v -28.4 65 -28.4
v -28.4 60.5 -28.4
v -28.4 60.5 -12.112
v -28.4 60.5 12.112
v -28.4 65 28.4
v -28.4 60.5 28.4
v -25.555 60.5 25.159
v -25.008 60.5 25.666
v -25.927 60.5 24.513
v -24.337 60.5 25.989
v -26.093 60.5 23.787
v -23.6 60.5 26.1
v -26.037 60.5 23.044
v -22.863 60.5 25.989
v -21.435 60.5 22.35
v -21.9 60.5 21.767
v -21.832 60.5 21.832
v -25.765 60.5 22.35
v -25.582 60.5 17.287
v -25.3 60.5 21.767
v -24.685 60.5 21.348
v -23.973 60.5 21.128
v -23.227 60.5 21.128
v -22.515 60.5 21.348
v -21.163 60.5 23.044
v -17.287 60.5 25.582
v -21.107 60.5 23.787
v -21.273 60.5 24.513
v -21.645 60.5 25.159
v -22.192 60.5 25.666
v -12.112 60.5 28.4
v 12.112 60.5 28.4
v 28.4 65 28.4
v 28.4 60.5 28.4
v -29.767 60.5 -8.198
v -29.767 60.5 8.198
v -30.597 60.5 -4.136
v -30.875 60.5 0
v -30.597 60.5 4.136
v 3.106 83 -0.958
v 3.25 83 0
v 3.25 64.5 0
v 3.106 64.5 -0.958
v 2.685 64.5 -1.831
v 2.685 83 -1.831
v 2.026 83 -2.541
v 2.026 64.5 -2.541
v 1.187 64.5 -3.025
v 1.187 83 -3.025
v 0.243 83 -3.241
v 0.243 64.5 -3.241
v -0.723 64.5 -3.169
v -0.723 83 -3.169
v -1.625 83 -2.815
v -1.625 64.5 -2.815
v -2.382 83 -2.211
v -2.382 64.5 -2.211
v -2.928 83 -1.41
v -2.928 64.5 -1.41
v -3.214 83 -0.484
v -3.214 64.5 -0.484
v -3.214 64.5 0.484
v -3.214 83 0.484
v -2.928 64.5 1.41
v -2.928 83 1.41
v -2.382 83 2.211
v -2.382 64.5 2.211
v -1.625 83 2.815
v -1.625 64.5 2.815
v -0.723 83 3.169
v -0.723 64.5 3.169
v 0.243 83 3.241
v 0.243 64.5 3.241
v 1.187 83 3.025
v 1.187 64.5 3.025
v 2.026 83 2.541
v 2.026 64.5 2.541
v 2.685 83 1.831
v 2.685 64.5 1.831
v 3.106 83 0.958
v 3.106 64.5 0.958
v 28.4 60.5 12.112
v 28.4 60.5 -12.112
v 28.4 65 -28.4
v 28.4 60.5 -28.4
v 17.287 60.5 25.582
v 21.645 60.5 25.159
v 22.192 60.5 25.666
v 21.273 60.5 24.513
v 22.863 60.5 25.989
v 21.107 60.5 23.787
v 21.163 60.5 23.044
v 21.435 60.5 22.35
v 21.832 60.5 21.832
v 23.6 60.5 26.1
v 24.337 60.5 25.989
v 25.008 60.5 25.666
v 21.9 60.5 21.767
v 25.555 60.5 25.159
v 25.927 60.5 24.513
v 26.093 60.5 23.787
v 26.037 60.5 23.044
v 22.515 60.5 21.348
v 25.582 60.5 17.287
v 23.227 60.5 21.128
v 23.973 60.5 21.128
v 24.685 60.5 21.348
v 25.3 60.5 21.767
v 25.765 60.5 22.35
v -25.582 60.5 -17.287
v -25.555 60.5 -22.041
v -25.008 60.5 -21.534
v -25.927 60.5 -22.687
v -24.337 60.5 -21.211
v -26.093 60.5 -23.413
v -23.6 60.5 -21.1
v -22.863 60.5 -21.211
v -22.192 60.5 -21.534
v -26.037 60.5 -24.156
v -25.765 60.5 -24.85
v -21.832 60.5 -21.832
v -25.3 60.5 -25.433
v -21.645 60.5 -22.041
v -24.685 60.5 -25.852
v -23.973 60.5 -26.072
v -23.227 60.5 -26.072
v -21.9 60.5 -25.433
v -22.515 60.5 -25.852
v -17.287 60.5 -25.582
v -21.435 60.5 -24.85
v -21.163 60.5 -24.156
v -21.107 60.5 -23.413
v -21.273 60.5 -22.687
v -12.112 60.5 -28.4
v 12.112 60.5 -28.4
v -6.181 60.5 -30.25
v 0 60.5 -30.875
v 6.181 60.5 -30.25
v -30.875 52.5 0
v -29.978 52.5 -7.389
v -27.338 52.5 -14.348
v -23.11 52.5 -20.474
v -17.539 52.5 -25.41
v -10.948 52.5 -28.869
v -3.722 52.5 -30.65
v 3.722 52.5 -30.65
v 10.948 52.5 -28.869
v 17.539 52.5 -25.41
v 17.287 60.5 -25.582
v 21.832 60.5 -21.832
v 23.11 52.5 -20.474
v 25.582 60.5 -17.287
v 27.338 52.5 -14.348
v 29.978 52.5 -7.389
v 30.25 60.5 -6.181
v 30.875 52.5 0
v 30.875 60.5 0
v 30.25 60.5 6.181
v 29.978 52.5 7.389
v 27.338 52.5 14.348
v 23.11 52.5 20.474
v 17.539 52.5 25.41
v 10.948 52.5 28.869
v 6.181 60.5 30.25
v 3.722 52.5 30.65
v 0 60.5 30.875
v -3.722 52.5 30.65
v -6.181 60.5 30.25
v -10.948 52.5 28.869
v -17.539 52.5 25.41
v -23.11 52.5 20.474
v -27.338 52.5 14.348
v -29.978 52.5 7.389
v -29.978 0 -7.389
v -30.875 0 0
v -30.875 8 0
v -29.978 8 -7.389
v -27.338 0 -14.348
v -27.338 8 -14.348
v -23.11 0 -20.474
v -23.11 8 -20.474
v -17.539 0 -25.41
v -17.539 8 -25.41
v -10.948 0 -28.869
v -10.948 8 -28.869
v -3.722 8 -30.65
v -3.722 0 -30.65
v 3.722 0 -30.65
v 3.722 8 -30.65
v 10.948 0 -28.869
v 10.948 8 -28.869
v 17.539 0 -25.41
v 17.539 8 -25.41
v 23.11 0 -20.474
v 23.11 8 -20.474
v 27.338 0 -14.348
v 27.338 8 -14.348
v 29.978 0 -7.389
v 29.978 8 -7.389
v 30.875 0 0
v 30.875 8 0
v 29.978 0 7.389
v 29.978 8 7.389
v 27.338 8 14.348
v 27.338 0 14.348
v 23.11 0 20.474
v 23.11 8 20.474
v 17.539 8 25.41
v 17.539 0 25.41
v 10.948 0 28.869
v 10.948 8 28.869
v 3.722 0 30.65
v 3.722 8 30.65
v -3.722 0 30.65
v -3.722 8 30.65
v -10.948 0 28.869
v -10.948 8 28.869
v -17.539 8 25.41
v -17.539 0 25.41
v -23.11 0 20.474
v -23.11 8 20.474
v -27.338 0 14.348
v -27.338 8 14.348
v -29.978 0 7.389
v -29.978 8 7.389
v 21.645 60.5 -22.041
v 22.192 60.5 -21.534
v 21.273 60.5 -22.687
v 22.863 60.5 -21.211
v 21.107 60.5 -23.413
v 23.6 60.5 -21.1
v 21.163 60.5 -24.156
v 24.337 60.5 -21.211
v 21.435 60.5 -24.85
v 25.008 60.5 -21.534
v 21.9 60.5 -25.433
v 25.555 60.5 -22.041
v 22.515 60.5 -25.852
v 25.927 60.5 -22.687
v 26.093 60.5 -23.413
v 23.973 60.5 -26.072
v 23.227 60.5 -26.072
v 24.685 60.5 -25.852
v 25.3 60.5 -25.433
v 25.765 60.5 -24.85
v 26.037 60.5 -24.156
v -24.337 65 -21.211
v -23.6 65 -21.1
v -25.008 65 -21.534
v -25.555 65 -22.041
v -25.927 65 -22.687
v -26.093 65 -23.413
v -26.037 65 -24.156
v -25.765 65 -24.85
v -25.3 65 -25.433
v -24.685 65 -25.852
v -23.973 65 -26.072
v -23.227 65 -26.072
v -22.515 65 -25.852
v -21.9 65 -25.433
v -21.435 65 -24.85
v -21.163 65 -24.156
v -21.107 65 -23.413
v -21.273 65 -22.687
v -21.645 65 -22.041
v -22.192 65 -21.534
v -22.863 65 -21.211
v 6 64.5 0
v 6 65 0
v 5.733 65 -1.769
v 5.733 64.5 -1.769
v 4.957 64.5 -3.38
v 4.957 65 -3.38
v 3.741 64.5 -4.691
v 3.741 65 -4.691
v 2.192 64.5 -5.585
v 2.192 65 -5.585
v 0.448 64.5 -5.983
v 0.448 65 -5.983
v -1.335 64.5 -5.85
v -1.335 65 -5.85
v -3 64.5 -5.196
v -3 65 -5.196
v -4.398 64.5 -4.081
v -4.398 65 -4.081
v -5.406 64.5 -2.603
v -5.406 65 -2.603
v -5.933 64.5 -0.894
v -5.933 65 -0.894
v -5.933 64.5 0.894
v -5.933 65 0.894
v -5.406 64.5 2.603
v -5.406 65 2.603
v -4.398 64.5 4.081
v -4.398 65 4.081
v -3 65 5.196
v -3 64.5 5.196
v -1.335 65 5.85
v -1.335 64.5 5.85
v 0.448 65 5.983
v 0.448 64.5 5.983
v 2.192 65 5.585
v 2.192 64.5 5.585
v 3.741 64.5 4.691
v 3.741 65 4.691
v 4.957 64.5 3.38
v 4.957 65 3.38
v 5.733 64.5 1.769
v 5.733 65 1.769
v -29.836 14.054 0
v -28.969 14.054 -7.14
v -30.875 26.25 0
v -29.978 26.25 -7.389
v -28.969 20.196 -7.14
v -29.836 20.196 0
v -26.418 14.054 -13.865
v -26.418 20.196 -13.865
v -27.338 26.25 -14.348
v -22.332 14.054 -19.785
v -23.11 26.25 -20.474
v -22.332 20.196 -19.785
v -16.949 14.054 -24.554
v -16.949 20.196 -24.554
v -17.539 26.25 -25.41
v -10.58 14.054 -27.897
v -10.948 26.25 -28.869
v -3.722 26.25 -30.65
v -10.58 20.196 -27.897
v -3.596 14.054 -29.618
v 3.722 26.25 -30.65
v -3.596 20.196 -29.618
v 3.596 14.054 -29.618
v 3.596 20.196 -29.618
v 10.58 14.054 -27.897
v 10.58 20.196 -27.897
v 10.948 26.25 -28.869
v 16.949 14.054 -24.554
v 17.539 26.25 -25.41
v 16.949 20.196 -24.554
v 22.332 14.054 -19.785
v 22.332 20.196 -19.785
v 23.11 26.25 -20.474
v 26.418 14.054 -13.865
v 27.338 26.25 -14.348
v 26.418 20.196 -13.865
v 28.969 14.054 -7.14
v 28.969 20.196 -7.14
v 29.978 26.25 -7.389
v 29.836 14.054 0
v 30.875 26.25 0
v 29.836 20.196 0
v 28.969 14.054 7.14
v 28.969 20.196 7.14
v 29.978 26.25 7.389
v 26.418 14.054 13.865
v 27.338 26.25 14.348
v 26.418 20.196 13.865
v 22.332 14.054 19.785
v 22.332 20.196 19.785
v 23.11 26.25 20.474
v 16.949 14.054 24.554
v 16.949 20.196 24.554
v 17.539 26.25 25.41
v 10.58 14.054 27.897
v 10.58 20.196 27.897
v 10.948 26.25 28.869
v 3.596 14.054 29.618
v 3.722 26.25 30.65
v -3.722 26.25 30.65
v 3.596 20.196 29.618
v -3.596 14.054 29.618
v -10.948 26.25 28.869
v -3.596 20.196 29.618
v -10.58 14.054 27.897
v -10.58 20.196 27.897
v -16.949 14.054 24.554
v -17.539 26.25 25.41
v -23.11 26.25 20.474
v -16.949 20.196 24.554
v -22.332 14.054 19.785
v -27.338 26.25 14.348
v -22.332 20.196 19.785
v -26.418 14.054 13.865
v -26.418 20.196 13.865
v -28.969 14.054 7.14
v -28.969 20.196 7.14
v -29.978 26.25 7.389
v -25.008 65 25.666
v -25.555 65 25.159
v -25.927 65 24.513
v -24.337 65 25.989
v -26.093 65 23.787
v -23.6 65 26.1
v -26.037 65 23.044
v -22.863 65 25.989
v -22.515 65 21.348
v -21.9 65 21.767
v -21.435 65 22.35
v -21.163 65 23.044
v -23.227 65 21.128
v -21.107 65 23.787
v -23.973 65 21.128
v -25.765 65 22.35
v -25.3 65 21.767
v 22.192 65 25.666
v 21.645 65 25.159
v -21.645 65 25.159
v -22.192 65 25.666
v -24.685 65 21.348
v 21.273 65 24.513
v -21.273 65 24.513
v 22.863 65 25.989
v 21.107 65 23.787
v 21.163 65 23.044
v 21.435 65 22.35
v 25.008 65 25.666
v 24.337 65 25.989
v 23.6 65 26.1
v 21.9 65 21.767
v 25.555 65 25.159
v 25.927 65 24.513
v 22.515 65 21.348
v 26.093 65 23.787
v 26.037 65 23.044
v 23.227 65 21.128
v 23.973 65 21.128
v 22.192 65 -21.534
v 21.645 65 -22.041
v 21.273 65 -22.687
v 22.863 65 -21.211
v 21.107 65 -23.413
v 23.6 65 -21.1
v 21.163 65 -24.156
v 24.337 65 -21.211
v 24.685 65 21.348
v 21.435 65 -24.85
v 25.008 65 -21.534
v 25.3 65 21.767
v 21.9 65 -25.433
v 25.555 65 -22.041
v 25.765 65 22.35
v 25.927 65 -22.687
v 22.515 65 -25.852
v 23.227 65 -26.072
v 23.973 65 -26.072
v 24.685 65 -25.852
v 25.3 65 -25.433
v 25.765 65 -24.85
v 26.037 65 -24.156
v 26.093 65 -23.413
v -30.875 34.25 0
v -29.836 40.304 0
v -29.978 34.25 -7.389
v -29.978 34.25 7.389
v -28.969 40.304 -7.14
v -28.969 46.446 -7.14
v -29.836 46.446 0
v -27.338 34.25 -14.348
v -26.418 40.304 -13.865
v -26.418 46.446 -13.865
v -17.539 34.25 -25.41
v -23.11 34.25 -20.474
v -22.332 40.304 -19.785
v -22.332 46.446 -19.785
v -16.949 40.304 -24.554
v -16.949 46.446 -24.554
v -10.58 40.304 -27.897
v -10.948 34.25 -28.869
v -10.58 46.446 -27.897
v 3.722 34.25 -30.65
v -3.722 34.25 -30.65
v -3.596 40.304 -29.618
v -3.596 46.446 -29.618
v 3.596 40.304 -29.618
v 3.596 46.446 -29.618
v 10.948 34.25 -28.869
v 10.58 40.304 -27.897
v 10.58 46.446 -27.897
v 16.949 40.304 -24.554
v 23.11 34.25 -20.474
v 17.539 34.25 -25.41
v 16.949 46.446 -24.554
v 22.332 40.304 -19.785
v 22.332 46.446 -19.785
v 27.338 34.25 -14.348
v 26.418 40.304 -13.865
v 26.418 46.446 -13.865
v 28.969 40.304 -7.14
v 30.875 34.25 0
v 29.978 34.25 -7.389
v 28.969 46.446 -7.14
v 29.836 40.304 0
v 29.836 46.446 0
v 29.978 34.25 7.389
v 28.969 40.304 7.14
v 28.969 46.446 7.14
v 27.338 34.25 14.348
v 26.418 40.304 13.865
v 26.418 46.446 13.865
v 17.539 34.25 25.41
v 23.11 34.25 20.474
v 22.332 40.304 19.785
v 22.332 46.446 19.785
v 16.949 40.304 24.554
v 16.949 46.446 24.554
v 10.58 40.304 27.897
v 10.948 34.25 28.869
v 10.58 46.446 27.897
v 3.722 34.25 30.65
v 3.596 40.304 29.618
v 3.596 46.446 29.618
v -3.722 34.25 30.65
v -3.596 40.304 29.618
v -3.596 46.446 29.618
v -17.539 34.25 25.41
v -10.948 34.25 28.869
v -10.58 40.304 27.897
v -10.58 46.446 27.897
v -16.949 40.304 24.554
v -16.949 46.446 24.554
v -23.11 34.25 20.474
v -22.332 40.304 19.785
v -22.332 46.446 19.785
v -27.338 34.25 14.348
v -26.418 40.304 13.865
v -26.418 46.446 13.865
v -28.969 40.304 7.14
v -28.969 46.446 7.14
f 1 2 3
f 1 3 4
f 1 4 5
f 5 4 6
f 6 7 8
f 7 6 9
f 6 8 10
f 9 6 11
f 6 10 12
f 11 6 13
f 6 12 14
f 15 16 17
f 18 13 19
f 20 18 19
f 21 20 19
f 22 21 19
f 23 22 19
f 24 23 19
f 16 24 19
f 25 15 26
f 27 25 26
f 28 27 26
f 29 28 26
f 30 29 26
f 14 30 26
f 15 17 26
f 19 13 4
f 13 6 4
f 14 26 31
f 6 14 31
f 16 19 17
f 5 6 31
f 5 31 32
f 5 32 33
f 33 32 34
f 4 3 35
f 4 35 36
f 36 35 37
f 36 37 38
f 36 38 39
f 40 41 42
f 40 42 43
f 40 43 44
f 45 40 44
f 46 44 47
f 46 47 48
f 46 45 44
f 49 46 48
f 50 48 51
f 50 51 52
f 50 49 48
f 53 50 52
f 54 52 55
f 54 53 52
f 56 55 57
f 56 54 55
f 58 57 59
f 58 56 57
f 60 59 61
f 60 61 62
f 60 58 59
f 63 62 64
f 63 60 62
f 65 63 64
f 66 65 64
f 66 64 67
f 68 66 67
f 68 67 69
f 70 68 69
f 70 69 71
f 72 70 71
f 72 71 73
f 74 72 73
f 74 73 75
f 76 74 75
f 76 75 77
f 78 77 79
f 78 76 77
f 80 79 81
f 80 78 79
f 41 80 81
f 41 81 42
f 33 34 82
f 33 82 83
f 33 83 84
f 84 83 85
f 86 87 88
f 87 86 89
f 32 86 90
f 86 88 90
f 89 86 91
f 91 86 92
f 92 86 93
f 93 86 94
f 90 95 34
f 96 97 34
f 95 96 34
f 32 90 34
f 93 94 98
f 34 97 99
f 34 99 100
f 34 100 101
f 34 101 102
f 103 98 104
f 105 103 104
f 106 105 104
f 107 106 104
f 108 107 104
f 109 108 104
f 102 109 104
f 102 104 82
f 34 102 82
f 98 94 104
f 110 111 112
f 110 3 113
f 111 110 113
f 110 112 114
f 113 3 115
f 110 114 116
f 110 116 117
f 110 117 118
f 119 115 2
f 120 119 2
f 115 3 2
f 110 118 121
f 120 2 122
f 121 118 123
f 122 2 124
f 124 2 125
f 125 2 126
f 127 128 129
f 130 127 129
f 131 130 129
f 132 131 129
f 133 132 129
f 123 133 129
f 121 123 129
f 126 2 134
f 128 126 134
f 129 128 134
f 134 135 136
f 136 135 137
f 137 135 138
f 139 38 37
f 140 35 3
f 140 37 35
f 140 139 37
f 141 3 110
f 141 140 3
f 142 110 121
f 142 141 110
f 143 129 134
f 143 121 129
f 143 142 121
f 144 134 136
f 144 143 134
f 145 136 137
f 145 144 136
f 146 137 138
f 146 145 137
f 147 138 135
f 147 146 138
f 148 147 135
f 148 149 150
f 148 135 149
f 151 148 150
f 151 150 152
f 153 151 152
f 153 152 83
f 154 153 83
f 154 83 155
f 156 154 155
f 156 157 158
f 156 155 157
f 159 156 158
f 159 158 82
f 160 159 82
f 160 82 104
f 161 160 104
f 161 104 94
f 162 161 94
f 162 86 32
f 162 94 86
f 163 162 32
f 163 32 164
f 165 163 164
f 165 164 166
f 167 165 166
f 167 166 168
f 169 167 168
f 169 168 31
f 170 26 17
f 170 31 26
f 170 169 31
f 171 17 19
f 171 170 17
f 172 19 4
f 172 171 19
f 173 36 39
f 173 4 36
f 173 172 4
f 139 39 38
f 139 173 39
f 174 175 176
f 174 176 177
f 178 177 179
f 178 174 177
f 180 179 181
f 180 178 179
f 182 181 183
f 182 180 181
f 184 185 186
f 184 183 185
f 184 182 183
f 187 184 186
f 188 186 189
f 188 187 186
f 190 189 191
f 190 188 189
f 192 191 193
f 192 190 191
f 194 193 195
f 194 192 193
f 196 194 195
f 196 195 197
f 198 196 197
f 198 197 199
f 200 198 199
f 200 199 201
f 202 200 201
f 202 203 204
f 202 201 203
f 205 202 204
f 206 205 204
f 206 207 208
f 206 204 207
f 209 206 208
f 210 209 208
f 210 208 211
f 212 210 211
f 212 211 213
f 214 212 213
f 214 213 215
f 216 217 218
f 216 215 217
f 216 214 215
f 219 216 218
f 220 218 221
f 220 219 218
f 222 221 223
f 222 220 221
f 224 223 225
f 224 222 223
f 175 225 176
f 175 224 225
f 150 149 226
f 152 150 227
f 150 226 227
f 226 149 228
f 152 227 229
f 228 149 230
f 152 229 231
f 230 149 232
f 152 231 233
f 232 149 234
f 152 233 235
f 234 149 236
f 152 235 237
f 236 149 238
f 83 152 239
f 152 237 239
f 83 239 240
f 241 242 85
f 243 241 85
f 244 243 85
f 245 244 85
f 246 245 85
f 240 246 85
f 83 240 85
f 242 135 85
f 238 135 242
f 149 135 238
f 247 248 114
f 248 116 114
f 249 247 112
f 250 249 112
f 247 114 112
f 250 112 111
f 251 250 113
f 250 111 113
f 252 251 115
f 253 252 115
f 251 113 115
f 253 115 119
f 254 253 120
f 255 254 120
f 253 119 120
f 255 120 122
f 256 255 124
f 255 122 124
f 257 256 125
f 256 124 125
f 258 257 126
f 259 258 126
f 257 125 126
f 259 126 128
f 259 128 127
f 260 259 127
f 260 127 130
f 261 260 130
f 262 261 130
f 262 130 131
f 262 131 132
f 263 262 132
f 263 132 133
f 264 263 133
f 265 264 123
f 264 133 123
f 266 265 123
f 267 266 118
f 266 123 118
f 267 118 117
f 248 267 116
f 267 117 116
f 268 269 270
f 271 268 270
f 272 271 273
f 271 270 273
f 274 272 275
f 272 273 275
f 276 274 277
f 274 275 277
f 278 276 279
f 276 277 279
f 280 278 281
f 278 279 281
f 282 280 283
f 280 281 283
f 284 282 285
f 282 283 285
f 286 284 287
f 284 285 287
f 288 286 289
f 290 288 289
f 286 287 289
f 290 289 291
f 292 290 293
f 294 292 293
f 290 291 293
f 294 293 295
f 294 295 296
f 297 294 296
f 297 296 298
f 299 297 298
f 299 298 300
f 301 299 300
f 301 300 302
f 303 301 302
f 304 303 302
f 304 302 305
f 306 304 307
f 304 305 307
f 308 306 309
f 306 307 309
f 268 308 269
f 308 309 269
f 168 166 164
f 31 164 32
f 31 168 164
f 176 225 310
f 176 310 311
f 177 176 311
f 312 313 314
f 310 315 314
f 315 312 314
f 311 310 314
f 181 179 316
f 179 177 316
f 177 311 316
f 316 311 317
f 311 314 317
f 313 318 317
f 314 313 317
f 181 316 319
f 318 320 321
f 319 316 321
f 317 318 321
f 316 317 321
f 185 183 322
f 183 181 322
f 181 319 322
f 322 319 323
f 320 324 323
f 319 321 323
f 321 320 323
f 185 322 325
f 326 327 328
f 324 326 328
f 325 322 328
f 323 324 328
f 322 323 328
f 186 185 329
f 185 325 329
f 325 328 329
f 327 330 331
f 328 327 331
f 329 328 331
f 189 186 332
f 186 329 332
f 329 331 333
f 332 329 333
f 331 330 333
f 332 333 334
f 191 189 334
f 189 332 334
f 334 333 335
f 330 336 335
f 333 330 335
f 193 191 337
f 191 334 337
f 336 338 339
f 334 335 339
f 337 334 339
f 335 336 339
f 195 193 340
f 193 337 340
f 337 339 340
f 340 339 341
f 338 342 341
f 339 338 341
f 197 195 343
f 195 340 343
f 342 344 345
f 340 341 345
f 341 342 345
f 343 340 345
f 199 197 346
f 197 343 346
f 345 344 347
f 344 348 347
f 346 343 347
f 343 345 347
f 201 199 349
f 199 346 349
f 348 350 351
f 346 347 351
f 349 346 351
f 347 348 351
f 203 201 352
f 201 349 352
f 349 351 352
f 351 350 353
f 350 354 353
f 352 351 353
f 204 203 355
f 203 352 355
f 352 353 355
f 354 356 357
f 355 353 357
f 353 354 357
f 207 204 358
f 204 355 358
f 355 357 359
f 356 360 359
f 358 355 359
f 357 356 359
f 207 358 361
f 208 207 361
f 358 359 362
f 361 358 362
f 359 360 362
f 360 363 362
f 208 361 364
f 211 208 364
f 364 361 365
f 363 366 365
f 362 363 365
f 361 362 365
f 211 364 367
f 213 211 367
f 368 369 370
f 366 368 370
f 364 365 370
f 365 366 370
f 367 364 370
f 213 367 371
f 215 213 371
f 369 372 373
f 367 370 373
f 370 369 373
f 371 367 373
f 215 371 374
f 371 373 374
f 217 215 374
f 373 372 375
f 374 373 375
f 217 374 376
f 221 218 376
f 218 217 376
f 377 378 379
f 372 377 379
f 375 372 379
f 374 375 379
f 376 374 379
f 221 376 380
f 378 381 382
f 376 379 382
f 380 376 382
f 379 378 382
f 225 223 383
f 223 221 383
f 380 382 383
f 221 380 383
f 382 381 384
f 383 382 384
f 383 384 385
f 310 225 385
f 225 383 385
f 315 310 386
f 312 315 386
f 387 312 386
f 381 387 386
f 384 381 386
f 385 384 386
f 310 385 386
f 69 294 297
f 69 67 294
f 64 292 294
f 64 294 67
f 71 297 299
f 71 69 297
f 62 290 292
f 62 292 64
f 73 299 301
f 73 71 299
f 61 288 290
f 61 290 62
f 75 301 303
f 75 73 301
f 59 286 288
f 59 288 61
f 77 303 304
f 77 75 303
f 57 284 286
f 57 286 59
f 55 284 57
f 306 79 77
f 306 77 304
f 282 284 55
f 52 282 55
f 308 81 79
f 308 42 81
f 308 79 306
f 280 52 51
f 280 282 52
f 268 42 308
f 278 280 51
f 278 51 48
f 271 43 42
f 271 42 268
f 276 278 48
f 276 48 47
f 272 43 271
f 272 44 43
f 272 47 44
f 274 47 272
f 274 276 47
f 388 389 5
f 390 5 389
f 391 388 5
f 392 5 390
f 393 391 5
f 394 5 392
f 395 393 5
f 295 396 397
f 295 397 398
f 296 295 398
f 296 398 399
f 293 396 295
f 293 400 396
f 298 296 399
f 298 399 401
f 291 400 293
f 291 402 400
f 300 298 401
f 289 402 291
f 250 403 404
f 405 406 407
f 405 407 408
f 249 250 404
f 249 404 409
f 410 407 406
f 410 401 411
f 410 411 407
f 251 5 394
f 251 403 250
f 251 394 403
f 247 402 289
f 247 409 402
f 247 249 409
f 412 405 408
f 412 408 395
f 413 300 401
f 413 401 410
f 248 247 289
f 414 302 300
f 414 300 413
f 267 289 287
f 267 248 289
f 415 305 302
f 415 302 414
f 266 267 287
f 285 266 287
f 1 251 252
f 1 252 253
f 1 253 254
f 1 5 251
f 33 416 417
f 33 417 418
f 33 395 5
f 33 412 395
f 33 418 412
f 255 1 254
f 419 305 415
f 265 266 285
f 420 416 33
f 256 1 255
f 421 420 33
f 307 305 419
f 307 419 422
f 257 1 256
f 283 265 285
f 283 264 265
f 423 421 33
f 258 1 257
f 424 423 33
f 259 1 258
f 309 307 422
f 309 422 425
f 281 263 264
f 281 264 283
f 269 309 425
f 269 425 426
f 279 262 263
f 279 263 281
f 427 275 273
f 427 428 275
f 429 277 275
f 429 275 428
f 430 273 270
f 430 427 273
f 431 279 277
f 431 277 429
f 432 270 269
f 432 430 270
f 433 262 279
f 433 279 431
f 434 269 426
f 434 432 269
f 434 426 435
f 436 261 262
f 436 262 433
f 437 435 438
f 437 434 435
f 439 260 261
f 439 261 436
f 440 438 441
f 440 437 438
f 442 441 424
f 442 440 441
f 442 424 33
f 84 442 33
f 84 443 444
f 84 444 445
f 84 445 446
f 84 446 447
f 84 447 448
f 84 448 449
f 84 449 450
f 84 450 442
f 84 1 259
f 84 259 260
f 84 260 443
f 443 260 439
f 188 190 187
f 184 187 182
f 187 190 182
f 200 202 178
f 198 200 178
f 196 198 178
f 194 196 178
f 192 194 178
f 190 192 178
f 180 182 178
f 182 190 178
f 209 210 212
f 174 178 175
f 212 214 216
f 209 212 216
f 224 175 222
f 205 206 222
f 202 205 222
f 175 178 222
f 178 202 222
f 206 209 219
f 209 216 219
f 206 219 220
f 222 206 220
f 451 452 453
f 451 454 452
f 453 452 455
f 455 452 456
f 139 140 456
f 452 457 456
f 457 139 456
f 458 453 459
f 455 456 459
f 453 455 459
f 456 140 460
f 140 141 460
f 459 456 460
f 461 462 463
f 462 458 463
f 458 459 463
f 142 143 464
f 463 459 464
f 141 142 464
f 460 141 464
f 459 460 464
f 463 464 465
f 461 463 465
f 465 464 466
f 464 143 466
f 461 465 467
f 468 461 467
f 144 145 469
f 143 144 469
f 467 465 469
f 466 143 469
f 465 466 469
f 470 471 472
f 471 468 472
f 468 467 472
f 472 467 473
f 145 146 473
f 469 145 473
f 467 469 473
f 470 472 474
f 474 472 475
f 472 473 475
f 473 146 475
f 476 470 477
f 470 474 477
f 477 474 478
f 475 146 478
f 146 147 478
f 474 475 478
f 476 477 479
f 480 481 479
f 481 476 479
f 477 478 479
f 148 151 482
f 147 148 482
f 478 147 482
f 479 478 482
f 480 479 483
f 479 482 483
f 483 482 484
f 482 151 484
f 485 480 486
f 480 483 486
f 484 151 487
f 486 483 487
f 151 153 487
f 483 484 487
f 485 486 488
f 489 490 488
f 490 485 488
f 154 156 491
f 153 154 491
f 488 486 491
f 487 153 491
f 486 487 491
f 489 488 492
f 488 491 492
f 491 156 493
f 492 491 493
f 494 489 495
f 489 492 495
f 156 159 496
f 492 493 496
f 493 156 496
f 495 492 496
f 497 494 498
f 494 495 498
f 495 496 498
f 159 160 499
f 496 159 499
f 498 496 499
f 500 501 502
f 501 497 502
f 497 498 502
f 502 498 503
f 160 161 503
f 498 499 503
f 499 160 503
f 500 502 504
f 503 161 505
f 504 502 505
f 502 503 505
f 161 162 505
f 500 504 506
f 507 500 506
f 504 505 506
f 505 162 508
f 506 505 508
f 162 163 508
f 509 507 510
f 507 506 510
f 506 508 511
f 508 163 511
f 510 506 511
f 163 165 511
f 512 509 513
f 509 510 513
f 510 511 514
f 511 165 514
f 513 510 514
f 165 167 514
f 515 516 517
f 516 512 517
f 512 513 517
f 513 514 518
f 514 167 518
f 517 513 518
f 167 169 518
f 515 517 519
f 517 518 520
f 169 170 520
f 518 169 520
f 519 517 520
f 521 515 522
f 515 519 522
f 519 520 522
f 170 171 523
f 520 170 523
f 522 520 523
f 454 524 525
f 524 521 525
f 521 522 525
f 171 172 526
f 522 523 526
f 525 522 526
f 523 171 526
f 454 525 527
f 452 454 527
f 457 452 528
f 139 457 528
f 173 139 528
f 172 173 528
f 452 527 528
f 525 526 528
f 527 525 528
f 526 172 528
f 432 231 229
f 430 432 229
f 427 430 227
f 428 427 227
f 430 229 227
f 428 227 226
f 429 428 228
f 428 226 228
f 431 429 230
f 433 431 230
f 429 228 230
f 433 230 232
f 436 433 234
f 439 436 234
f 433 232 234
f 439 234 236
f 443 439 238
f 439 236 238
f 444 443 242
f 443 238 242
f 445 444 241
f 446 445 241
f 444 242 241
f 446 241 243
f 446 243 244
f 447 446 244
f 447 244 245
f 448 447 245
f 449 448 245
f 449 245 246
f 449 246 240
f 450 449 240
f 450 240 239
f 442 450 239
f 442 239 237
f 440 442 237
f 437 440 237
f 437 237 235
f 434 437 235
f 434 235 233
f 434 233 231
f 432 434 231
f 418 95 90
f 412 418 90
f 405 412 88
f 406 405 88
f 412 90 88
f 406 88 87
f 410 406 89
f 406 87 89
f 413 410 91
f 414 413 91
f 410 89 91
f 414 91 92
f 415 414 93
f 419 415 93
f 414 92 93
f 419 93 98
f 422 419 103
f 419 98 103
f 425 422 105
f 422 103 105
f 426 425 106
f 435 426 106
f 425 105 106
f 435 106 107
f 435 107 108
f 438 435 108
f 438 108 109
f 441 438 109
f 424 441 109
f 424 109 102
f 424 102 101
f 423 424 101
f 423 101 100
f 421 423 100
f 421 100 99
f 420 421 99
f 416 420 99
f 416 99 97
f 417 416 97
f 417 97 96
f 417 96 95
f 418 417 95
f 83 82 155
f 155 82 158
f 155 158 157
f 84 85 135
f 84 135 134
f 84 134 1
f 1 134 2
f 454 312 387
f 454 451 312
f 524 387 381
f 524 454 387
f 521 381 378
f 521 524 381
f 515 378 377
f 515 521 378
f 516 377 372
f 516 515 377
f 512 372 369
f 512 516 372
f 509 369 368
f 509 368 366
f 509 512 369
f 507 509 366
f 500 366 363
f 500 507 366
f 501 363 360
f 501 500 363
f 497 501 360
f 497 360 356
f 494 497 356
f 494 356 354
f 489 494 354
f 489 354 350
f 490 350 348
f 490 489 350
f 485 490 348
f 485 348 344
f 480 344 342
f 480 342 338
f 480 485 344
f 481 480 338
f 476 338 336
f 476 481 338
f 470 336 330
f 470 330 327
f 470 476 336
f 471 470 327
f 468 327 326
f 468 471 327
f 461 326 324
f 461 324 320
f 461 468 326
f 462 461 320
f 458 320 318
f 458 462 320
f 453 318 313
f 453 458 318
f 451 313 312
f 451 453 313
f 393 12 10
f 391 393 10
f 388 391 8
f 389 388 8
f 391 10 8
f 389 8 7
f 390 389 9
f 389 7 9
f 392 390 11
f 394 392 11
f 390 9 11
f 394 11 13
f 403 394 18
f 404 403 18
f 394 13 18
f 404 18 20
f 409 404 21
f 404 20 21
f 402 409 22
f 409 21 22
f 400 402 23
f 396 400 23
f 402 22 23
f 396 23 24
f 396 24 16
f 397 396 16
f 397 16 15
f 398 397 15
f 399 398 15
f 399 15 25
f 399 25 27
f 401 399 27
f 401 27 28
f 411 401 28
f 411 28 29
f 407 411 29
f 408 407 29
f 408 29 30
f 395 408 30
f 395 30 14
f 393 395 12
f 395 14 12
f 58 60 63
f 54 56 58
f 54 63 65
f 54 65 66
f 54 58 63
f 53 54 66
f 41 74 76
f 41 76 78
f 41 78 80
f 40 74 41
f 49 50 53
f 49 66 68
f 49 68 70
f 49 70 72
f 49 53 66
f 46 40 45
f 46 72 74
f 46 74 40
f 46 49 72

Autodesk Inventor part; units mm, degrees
ref_plane "YZ Plane" through (0, 0, 0) normal (1, 0, 0) x (0, 1, 0)
ref_plane "XZ Plane" through (0, 0, 0) normal (0, 1, 0) x (-1, 0, 0)
ref_plane "XY Plane" through (0, 0, 0) normal (0, 0, 1) x (1, 0, 0)
sketch "Esboço1" plane through (0, 0, 0) normal (0, 1, 0) x (-1, 0, 0)
  circle A0 centre (0, 0) radius 30.875
  dimension "d0" = 61.75
extrude "Extrusão1" add sketch "Esboço1" along normal blind 60.5
sketch "Esboço2" plane through (0, 60.5, 0) normal (0, 1, 0) x (1, 0, 0)
  line L0 (-28.4, -28.4) -> (28.4, -28.4)
  line L1 (28.4, -28.4) -> (28.4, 28.4)
  line L2 (28.4, 28.4) -> (-28.4, 28.4)
  line L3 (-28.4, 28.4) -> (-28.4, -28.4)
  point P0 (0, 0)
  dimension "d3" = 56.8
  dimension "d4" = 56.8
  dimension "d5" = 28.4
  dimension "d6" = 28.4
extrude "Extrusão2" add sketch "Esboço2" along normal blind 4.5
sketch "Esboço3" plane through (0, 65, 0) normal (0, 1, 0) x (1, 0, 0)
  line L0 (-28.4, -28.4) -> (28.4, -28.4) projected
  line L1 (28.4, -28.4) -> (28.4, 28.4) projected
  line L2 (-28.4, 28.4) -> (-28.4, -28.4) projected
  line L3 (28.4, 28.4) -> (-28.4, 28.4) projected
  point P0 (0, 0)
  point P1 (23.6, -23.6)
  point P2 (-23.6, -23.6)
  point P3 (-23.6, 23.6)
  point P4 (23.6, 23.6)
  dimension "d9" = 4.8
  dimension "d10" = 4.8
  dimension "d11" = 4.8
  dimension "d12" = 4.8
  dimension "d13" = 4.8
  dimension "d14" = 4.8
  dimension "d15" = 4.8
  dimension "d16" = 4.8
hole "Furo1" at (23.6, 65, 23.6) at (-23.6, 65, 23.6) at (-23.6, 65, -23.6) at (23.6, 65, -23.6) direction (0, -1, 0) diameter 5 depth 4.5
sketch "Esboço4" plane through (0, 65, 0) normal (0, 1, 0) x (1, 0, 0)
  circle A0 centre (0, 0) radius 3.25
  dimension "d24" = 6.5
extrude "Extrusão3" add sketch "Esboço4" along normal blind 18
sketch "Esboço5" plane through (0, 65, 0) normal (0, 1, 0) x (1, 0, 0)
  circle A0 centre (0, 0) radius 6
  circle A1 centre (0, 0) radius 3.25 projected
  dimension "d27" = 12
extrude "Extrusão4" cut sketch "Esboço5" against normal blind 0.5
sketch "Esboço6" plane through (0, 0, 0) normal (0, 0, 1) x (1, 0, 0)
  line L0 (0, 0) -> (0, 60.5)
  line L1 (-12.1122, 60.5) -> (12.1122, 60.5) projected
  line L2 (0, 60.5) -> (-30.875, 60.5)
  line L3 (-30.875, 60.5) -> (-30.875, 52.5)
  line L4 (-30.875, 0) -> (-30.875, 60.5) projected
  arc A0 (-30.875, 34.25) -> (-30.875, 52.5) centre (-65.875, 43.375) ccw
  line L5 (30.875, 0) -> (-30.875, 0) projected
  line L6 (-30.875, 0) -> (-30.875, 8)
  arc A1 (-30.875, 8) -> (-30.875, 26.25) centre (-65.875, 17.125) ccw
  line L7 (-30.875, 26.25) -> (-30.875, 34.25)
  line L8 (-30.875, 0) -> (0, 0)
  line L9 (-30.875, 60.5) -> (-66.7077, 60.5)
  line L10 (-66.7077, 60.5) -> (-66.7077, 0)
  line L11 (-66.7077, 0) -> (-30.875, 0)
  dimension "d32" = 0
  dimension "d33" = 35
  dimension "d34" = 0
  dimension "d36" = 8
  dimension "d37" = 8
  dimension "d40" = 8
revolve "Revolução1" cut sketch "Esboço6" angle 360 about axis through (0, 0, 0) along (0, 1, 0) contours L11 L10 L9 L3 L4 | L4 A1 | A0 L4
equation "\"d4\" = d3"
equation "\"d5\" = 0.5 * d3"
equation "\"d6\" = 0.5 * d4"
equation "\"d10\" = d9"
equation "\"d11\" = d10"
equation "\"d12\" = d10"
equation "\"d13\" = d12"
equation "\"d14\" = d10"
equation "\"d15\" = d9"
equation "\"d16\" = d9"
equation "\"d22\" = Espessura"
equation "\"Raio_vergadura\" = Espessura"
equation "\"Largura_alívio_de_vergadura\" = Espessura"
equation "\"Profundidade_alívio_de_vergadura\" = 0.5 * Espessura"
equation "\"Tamanho_alívio_de_dobra\" = 4 * Espessura"
equation "\"Remanescente_mínimo\" = 2 * Espessura"
equation "\"Raiodetransição\" = Raio_vergadura"
equation "\"Tamanho_de_raio_de_Jacobi\" = Raio_vergadura"
equation "\"TamanhoFolga\" = Espessura"
equation "\"Espessura\" = 0.5"
properties part number "Motor" material "Steel"
